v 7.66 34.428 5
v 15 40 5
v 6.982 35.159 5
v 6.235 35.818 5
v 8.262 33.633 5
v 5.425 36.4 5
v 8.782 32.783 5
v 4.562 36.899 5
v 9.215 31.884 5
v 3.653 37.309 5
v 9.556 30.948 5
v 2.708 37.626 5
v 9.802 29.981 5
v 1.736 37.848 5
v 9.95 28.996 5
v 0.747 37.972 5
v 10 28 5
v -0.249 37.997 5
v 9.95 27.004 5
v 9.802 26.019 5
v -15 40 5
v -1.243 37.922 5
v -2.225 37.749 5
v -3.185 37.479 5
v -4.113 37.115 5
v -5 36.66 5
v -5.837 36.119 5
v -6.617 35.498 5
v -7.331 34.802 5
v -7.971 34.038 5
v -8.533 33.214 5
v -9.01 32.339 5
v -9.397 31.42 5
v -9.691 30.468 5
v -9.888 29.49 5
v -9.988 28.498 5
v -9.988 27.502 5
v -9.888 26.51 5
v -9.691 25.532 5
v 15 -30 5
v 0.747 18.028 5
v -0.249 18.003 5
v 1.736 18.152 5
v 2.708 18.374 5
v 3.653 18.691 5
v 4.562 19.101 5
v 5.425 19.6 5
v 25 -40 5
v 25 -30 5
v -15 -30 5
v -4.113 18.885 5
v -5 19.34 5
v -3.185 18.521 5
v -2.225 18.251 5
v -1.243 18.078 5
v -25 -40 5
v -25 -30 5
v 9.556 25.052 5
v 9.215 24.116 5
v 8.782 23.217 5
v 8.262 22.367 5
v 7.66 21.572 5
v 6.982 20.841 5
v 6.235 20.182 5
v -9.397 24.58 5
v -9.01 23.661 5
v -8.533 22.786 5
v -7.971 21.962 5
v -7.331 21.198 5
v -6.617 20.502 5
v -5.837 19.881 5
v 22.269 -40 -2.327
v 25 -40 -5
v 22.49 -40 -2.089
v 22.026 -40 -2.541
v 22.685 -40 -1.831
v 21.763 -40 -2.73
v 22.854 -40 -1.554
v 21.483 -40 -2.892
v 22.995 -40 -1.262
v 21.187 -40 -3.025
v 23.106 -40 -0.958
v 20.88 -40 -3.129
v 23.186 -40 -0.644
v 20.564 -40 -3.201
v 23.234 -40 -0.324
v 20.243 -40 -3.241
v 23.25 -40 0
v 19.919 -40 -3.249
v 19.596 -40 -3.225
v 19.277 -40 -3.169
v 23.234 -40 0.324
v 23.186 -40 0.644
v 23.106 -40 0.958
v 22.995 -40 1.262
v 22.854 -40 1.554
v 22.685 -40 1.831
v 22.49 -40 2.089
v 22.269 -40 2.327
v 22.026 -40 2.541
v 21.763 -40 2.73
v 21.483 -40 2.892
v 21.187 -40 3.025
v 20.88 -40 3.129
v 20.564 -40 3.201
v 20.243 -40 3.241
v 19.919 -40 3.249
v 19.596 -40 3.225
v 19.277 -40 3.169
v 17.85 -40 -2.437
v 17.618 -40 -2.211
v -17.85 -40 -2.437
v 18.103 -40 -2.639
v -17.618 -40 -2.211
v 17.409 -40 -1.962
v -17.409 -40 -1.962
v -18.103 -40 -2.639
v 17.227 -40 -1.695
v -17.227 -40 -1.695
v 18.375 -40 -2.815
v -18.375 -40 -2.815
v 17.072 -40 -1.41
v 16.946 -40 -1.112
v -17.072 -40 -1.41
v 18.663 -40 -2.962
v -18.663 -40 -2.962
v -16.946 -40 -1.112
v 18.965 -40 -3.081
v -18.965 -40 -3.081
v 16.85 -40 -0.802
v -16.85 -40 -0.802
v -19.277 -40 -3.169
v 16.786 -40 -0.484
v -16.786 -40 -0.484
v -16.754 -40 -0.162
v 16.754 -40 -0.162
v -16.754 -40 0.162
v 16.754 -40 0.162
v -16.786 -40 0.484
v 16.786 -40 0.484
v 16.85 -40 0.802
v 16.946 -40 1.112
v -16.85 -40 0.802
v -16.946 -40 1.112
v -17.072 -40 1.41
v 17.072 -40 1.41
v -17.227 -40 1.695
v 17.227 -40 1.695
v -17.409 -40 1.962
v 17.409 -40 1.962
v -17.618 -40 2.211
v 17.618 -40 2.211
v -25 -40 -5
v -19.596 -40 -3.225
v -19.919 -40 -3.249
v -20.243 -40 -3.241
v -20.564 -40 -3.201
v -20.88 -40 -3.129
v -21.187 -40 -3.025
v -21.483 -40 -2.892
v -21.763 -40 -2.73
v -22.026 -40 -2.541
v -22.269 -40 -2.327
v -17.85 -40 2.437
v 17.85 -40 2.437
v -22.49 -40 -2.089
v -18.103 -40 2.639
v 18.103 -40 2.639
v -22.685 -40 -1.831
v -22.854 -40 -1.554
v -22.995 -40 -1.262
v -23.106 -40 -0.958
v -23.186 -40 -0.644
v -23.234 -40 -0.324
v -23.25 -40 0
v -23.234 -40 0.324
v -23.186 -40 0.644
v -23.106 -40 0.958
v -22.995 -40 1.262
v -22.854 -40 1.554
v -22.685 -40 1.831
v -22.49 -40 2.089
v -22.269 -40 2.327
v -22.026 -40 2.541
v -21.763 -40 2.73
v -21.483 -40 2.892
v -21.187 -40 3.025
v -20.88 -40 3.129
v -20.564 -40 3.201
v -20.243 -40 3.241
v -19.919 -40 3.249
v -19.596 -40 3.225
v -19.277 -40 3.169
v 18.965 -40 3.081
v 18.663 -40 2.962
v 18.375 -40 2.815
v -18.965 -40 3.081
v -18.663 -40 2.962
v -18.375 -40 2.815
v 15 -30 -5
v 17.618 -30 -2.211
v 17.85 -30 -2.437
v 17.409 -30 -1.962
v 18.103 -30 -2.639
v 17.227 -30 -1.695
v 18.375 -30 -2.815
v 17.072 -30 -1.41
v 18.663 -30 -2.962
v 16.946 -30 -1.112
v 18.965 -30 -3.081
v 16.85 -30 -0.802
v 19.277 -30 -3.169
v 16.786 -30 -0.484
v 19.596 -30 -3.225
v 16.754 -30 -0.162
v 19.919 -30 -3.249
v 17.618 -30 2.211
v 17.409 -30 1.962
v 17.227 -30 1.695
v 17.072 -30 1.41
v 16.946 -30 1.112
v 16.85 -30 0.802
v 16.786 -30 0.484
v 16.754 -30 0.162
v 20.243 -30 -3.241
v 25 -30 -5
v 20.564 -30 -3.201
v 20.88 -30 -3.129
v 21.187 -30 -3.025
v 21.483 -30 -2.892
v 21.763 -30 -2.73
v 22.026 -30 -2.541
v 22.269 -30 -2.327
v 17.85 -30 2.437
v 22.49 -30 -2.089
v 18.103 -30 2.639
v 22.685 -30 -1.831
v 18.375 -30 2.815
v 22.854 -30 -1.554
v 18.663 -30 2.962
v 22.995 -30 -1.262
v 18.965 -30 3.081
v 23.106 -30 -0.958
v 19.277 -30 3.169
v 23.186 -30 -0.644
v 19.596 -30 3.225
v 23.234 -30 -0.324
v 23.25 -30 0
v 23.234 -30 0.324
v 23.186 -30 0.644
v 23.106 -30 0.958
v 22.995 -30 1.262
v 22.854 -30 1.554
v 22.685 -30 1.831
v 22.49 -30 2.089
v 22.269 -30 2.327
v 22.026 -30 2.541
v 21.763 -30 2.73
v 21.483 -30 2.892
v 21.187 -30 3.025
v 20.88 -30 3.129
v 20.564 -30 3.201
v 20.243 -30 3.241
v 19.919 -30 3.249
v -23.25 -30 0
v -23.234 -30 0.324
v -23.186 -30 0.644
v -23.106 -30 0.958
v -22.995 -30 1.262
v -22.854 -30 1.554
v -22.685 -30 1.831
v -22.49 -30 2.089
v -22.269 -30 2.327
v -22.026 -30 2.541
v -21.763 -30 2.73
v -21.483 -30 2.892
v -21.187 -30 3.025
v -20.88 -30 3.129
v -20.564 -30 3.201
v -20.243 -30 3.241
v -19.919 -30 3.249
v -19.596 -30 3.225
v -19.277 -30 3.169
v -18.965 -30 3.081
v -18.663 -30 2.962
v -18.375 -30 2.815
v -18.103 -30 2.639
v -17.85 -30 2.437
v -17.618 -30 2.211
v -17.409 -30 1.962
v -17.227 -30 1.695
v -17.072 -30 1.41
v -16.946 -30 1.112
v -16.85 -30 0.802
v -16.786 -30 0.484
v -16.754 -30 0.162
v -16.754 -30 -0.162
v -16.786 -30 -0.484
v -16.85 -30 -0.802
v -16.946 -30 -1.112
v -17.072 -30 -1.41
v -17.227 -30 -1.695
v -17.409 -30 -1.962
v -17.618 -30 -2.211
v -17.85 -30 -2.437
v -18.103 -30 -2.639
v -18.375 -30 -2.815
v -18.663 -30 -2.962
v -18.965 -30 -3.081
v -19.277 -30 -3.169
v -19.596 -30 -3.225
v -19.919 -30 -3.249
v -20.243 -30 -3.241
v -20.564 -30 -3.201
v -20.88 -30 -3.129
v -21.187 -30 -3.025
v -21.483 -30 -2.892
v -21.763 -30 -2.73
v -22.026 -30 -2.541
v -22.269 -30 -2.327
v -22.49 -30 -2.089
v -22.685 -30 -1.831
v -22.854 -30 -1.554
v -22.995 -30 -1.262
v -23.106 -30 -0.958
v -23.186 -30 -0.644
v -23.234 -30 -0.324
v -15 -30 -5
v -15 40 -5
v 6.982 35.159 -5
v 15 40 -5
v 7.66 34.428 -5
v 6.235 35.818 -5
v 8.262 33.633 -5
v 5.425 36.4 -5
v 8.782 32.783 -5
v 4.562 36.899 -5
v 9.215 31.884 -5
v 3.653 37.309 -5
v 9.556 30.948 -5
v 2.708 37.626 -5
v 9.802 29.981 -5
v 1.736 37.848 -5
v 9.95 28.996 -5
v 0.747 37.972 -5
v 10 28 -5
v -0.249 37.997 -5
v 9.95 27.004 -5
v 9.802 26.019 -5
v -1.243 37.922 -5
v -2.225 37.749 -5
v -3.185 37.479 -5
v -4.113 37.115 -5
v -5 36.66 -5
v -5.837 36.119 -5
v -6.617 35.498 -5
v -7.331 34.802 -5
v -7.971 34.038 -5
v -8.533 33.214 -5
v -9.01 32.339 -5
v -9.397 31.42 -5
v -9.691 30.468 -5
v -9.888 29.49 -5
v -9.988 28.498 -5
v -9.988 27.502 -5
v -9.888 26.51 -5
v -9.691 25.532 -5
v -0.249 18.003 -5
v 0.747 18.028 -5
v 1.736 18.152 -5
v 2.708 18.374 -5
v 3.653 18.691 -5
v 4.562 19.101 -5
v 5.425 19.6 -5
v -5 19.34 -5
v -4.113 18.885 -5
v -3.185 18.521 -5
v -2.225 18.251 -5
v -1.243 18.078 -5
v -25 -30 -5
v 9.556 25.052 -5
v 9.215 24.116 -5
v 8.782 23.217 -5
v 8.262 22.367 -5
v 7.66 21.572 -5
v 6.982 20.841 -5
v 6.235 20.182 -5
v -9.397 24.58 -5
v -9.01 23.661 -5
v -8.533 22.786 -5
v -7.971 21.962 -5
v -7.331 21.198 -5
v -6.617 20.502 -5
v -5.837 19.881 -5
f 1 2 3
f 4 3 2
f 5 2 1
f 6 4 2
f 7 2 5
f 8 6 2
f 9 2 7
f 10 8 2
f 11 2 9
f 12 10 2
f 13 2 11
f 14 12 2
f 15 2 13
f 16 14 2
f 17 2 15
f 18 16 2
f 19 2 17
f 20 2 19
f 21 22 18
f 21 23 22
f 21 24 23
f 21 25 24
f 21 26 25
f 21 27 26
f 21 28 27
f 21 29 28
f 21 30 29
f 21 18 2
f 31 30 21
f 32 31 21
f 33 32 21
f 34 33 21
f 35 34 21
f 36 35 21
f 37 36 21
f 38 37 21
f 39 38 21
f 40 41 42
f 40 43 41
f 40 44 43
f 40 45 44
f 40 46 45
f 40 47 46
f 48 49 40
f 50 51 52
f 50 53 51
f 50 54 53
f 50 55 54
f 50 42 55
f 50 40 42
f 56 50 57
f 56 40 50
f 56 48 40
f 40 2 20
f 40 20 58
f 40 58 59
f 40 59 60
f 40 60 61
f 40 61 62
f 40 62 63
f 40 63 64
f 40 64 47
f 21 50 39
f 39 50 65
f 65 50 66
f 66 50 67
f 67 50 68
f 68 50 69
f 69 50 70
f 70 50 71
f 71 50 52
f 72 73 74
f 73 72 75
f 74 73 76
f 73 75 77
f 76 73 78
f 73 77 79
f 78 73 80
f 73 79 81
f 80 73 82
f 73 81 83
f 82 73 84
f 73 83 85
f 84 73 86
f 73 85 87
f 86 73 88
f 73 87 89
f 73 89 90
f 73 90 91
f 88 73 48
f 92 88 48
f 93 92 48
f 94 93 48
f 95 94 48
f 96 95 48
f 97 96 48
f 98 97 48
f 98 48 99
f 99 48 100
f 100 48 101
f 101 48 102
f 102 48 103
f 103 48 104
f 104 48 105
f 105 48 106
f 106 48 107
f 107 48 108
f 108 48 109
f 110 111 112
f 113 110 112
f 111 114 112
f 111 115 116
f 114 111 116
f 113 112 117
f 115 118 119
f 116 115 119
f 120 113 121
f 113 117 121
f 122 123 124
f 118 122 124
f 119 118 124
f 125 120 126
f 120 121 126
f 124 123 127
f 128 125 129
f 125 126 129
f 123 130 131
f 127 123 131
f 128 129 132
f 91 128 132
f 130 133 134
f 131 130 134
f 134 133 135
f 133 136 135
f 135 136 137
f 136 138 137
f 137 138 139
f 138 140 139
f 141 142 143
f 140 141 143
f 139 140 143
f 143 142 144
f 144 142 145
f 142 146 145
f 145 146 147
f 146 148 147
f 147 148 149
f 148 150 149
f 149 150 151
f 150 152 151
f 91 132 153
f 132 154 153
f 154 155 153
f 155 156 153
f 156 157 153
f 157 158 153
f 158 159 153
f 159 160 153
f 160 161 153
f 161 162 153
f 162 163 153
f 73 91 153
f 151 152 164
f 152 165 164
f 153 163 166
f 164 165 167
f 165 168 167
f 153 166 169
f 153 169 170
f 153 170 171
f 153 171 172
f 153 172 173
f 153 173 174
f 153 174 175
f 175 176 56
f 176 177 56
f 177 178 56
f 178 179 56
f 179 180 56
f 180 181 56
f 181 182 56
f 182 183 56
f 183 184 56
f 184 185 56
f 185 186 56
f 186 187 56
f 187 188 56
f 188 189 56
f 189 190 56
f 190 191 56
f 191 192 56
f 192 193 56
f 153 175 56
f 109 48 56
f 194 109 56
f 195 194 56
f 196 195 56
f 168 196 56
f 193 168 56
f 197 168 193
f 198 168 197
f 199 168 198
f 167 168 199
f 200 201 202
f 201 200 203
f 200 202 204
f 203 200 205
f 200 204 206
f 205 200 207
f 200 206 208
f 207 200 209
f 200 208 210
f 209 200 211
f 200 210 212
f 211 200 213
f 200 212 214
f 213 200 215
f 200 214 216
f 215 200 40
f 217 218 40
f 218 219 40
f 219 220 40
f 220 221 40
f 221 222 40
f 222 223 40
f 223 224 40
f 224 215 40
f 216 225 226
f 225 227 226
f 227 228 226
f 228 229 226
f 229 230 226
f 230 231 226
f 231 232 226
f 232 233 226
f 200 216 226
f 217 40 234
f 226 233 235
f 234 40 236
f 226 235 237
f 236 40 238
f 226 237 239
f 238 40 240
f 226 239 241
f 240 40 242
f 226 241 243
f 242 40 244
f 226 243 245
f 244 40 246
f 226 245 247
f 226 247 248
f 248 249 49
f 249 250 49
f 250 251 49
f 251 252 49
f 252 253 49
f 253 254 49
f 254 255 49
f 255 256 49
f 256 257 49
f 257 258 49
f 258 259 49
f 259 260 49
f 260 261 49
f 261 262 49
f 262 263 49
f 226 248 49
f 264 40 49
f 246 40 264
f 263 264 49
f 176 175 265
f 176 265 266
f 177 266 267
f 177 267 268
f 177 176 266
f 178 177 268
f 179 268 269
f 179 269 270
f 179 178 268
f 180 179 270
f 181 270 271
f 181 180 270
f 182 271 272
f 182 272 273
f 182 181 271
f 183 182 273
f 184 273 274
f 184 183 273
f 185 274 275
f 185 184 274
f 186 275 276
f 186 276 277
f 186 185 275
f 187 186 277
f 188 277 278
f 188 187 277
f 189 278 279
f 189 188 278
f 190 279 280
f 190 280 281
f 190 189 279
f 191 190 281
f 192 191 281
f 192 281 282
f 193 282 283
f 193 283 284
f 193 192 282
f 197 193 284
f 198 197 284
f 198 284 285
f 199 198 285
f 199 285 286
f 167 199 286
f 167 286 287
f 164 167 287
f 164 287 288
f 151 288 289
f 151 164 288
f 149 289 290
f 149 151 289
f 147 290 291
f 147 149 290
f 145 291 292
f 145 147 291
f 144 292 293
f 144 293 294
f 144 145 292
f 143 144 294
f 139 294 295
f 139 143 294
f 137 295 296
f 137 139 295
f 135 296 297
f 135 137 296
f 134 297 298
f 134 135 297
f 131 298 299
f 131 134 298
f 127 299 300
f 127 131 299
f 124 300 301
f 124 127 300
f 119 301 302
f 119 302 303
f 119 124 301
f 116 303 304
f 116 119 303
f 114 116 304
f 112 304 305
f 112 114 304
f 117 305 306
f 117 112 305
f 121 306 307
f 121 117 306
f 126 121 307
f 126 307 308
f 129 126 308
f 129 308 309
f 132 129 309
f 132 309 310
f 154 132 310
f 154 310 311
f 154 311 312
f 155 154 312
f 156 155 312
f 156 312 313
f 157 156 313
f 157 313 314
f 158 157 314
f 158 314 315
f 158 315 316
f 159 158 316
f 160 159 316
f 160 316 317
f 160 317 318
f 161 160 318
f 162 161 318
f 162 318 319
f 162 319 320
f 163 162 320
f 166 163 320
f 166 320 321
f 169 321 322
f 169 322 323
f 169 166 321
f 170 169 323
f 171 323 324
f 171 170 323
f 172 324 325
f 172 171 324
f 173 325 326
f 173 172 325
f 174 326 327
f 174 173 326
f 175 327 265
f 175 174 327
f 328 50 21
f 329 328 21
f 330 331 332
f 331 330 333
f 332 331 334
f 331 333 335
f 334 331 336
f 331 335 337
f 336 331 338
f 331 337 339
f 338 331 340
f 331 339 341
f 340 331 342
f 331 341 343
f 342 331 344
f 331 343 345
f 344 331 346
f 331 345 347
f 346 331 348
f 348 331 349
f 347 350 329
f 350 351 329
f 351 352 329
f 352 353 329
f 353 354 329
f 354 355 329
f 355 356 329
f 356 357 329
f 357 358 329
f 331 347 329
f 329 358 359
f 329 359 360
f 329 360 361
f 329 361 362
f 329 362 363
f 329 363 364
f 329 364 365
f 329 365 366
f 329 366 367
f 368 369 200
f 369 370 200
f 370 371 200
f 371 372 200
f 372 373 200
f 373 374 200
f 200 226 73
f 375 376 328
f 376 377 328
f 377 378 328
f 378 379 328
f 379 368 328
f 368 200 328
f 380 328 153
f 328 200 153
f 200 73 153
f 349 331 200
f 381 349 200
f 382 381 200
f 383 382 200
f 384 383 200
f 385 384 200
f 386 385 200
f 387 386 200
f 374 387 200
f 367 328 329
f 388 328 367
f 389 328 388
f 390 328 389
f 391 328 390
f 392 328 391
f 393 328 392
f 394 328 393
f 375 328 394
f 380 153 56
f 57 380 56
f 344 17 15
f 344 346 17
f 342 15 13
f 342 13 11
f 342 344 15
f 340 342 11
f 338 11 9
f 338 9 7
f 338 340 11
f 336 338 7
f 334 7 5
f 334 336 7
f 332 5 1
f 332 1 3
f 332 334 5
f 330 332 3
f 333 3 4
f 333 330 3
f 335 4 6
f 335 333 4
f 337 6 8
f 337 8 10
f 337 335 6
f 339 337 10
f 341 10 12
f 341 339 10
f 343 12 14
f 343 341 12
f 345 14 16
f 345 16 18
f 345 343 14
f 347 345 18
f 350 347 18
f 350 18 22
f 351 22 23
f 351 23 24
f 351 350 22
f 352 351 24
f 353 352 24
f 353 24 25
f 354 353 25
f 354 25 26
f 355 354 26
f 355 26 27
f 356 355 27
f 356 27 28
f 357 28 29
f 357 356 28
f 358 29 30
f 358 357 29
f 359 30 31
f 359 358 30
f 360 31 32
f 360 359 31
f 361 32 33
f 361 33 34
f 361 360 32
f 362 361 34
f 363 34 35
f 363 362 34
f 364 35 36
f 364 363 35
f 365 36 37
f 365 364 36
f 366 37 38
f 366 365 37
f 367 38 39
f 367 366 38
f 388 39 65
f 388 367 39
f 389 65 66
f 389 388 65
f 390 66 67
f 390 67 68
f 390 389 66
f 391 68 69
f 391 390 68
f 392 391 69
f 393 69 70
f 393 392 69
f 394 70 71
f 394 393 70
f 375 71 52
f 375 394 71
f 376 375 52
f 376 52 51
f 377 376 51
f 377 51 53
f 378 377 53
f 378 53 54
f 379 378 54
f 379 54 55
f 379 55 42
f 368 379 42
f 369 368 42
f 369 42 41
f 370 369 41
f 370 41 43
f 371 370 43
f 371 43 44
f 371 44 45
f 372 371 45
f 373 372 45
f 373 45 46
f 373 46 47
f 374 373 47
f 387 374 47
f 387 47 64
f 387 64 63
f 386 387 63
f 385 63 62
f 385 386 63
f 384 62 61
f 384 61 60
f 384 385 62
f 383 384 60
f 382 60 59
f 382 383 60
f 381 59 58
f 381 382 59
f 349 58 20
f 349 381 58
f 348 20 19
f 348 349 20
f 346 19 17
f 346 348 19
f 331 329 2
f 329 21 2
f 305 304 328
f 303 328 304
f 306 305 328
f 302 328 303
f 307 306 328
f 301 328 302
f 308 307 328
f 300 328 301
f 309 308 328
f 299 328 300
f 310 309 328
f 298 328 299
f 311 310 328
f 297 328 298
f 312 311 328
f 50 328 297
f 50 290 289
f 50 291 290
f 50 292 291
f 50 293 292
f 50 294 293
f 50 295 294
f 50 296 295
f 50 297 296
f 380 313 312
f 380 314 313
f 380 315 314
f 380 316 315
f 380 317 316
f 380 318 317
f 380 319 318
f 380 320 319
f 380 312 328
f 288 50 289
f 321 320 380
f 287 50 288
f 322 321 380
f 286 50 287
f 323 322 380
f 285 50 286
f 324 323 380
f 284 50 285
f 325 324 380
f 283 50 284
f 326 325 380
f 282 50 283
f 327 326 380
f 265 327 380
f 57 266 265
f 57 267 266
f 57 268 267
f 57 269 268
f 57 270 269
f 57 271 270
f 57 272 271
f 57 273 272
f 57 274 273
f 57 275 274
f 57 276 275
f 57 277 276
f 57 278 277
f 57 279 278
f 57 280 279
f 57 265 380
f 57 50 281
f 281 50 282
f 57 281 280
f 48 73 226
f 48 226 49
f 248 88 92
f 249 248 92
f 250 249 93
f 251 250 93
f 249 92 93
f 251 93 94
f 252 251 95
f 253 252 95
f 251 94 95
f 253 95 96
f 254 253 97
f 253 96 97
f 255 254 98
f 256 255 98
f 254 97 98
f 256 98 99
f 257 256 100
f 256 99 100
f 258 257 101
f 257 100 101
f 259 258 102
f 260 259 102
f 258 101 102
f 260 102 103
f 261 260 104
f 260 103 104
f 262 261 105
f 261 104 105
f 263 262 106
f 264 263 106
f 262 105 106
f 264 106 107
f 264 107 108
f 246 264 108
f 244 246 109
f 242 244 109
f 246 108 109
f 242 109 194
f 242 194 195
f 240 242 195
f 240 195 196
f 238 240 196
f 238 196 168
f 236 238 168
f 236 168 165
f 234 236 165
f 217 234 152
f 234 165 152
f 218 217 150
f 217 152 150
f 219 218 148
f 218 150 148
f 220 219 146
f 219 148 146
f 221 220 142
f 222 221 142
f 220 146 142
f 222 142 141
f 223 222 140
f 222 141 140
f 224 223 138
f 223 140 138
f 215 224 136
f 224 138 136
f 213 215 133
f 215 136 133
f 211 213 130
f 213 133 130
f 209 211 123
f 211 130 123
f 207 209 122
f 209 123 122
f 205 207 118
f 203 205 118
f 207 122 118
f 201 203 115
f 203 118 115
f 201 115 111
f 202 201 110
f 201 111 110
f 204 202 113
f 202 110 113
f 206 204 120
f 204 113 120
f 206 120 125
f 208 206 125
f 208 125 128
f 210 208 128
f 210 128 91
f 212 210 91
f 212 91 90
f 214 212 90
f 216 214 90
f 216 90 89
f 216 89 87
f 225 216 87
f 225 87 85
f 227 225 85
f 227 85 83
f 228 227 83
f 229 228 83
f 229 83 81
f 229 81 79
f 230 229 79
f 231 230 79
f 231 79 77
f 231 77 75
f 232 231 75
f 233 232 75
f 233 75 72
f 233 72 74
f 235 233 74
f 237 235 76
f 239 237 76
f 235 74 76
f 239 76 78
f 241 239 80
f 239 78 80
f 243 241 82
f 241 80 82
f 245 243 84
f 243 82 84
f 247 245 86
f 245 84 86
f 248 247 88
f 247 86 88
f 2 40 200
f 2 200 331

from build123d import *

# Parameters (mm, degrees)
SKETCH1_W           = 30
SKETCH1_H           = 80
SKETCH1_R           = 10
BOSS_EXTRUDE1_DEPTH = 5
SKETCH2_W           = 10
SKETCH2_H           = 10
SKETCH2_R           = 3.25
BOSS_EXTRUDE2_DEPTH = 10


with BuildPart() as part:
    # Sketch1 → Boss-Extrude1 (new body, symmetric)
    with BuildSketch(Plane.XY):
        Rectangle(SKETCH1_W, SKETCH1_H)
        with Locations((0, 28)):
            Circle(SKETCH1_R, mode=Mode.SUBTRACT)
    extrude(amount=BOSS_EXTRUDE1_DEPTH, both=True)

    # Sketch2 → Boss-Extrude2 (add)
    with BuildSketch(Plane.XZ.offset(40)):
        with Locations((20, 0)):
            Rectangle(SKETCH2_W, SKETCH2_H)
        with Locations((20, 0)):
            Circle(SKETCH2_R, mode=Mode.SUBTRACT)
    boss_extrude2 = extrude(amount=-BOSS_EXTRUDE2_DEPTH)

    # Mirror1: Boss-Extrude2 across plane
    add(boss_extrude2.mirror(Plane(origin=(0, 0, 0), x_dir=(0, 0, 1), z_dir=(1, 0, 0))))


solid = part.part
